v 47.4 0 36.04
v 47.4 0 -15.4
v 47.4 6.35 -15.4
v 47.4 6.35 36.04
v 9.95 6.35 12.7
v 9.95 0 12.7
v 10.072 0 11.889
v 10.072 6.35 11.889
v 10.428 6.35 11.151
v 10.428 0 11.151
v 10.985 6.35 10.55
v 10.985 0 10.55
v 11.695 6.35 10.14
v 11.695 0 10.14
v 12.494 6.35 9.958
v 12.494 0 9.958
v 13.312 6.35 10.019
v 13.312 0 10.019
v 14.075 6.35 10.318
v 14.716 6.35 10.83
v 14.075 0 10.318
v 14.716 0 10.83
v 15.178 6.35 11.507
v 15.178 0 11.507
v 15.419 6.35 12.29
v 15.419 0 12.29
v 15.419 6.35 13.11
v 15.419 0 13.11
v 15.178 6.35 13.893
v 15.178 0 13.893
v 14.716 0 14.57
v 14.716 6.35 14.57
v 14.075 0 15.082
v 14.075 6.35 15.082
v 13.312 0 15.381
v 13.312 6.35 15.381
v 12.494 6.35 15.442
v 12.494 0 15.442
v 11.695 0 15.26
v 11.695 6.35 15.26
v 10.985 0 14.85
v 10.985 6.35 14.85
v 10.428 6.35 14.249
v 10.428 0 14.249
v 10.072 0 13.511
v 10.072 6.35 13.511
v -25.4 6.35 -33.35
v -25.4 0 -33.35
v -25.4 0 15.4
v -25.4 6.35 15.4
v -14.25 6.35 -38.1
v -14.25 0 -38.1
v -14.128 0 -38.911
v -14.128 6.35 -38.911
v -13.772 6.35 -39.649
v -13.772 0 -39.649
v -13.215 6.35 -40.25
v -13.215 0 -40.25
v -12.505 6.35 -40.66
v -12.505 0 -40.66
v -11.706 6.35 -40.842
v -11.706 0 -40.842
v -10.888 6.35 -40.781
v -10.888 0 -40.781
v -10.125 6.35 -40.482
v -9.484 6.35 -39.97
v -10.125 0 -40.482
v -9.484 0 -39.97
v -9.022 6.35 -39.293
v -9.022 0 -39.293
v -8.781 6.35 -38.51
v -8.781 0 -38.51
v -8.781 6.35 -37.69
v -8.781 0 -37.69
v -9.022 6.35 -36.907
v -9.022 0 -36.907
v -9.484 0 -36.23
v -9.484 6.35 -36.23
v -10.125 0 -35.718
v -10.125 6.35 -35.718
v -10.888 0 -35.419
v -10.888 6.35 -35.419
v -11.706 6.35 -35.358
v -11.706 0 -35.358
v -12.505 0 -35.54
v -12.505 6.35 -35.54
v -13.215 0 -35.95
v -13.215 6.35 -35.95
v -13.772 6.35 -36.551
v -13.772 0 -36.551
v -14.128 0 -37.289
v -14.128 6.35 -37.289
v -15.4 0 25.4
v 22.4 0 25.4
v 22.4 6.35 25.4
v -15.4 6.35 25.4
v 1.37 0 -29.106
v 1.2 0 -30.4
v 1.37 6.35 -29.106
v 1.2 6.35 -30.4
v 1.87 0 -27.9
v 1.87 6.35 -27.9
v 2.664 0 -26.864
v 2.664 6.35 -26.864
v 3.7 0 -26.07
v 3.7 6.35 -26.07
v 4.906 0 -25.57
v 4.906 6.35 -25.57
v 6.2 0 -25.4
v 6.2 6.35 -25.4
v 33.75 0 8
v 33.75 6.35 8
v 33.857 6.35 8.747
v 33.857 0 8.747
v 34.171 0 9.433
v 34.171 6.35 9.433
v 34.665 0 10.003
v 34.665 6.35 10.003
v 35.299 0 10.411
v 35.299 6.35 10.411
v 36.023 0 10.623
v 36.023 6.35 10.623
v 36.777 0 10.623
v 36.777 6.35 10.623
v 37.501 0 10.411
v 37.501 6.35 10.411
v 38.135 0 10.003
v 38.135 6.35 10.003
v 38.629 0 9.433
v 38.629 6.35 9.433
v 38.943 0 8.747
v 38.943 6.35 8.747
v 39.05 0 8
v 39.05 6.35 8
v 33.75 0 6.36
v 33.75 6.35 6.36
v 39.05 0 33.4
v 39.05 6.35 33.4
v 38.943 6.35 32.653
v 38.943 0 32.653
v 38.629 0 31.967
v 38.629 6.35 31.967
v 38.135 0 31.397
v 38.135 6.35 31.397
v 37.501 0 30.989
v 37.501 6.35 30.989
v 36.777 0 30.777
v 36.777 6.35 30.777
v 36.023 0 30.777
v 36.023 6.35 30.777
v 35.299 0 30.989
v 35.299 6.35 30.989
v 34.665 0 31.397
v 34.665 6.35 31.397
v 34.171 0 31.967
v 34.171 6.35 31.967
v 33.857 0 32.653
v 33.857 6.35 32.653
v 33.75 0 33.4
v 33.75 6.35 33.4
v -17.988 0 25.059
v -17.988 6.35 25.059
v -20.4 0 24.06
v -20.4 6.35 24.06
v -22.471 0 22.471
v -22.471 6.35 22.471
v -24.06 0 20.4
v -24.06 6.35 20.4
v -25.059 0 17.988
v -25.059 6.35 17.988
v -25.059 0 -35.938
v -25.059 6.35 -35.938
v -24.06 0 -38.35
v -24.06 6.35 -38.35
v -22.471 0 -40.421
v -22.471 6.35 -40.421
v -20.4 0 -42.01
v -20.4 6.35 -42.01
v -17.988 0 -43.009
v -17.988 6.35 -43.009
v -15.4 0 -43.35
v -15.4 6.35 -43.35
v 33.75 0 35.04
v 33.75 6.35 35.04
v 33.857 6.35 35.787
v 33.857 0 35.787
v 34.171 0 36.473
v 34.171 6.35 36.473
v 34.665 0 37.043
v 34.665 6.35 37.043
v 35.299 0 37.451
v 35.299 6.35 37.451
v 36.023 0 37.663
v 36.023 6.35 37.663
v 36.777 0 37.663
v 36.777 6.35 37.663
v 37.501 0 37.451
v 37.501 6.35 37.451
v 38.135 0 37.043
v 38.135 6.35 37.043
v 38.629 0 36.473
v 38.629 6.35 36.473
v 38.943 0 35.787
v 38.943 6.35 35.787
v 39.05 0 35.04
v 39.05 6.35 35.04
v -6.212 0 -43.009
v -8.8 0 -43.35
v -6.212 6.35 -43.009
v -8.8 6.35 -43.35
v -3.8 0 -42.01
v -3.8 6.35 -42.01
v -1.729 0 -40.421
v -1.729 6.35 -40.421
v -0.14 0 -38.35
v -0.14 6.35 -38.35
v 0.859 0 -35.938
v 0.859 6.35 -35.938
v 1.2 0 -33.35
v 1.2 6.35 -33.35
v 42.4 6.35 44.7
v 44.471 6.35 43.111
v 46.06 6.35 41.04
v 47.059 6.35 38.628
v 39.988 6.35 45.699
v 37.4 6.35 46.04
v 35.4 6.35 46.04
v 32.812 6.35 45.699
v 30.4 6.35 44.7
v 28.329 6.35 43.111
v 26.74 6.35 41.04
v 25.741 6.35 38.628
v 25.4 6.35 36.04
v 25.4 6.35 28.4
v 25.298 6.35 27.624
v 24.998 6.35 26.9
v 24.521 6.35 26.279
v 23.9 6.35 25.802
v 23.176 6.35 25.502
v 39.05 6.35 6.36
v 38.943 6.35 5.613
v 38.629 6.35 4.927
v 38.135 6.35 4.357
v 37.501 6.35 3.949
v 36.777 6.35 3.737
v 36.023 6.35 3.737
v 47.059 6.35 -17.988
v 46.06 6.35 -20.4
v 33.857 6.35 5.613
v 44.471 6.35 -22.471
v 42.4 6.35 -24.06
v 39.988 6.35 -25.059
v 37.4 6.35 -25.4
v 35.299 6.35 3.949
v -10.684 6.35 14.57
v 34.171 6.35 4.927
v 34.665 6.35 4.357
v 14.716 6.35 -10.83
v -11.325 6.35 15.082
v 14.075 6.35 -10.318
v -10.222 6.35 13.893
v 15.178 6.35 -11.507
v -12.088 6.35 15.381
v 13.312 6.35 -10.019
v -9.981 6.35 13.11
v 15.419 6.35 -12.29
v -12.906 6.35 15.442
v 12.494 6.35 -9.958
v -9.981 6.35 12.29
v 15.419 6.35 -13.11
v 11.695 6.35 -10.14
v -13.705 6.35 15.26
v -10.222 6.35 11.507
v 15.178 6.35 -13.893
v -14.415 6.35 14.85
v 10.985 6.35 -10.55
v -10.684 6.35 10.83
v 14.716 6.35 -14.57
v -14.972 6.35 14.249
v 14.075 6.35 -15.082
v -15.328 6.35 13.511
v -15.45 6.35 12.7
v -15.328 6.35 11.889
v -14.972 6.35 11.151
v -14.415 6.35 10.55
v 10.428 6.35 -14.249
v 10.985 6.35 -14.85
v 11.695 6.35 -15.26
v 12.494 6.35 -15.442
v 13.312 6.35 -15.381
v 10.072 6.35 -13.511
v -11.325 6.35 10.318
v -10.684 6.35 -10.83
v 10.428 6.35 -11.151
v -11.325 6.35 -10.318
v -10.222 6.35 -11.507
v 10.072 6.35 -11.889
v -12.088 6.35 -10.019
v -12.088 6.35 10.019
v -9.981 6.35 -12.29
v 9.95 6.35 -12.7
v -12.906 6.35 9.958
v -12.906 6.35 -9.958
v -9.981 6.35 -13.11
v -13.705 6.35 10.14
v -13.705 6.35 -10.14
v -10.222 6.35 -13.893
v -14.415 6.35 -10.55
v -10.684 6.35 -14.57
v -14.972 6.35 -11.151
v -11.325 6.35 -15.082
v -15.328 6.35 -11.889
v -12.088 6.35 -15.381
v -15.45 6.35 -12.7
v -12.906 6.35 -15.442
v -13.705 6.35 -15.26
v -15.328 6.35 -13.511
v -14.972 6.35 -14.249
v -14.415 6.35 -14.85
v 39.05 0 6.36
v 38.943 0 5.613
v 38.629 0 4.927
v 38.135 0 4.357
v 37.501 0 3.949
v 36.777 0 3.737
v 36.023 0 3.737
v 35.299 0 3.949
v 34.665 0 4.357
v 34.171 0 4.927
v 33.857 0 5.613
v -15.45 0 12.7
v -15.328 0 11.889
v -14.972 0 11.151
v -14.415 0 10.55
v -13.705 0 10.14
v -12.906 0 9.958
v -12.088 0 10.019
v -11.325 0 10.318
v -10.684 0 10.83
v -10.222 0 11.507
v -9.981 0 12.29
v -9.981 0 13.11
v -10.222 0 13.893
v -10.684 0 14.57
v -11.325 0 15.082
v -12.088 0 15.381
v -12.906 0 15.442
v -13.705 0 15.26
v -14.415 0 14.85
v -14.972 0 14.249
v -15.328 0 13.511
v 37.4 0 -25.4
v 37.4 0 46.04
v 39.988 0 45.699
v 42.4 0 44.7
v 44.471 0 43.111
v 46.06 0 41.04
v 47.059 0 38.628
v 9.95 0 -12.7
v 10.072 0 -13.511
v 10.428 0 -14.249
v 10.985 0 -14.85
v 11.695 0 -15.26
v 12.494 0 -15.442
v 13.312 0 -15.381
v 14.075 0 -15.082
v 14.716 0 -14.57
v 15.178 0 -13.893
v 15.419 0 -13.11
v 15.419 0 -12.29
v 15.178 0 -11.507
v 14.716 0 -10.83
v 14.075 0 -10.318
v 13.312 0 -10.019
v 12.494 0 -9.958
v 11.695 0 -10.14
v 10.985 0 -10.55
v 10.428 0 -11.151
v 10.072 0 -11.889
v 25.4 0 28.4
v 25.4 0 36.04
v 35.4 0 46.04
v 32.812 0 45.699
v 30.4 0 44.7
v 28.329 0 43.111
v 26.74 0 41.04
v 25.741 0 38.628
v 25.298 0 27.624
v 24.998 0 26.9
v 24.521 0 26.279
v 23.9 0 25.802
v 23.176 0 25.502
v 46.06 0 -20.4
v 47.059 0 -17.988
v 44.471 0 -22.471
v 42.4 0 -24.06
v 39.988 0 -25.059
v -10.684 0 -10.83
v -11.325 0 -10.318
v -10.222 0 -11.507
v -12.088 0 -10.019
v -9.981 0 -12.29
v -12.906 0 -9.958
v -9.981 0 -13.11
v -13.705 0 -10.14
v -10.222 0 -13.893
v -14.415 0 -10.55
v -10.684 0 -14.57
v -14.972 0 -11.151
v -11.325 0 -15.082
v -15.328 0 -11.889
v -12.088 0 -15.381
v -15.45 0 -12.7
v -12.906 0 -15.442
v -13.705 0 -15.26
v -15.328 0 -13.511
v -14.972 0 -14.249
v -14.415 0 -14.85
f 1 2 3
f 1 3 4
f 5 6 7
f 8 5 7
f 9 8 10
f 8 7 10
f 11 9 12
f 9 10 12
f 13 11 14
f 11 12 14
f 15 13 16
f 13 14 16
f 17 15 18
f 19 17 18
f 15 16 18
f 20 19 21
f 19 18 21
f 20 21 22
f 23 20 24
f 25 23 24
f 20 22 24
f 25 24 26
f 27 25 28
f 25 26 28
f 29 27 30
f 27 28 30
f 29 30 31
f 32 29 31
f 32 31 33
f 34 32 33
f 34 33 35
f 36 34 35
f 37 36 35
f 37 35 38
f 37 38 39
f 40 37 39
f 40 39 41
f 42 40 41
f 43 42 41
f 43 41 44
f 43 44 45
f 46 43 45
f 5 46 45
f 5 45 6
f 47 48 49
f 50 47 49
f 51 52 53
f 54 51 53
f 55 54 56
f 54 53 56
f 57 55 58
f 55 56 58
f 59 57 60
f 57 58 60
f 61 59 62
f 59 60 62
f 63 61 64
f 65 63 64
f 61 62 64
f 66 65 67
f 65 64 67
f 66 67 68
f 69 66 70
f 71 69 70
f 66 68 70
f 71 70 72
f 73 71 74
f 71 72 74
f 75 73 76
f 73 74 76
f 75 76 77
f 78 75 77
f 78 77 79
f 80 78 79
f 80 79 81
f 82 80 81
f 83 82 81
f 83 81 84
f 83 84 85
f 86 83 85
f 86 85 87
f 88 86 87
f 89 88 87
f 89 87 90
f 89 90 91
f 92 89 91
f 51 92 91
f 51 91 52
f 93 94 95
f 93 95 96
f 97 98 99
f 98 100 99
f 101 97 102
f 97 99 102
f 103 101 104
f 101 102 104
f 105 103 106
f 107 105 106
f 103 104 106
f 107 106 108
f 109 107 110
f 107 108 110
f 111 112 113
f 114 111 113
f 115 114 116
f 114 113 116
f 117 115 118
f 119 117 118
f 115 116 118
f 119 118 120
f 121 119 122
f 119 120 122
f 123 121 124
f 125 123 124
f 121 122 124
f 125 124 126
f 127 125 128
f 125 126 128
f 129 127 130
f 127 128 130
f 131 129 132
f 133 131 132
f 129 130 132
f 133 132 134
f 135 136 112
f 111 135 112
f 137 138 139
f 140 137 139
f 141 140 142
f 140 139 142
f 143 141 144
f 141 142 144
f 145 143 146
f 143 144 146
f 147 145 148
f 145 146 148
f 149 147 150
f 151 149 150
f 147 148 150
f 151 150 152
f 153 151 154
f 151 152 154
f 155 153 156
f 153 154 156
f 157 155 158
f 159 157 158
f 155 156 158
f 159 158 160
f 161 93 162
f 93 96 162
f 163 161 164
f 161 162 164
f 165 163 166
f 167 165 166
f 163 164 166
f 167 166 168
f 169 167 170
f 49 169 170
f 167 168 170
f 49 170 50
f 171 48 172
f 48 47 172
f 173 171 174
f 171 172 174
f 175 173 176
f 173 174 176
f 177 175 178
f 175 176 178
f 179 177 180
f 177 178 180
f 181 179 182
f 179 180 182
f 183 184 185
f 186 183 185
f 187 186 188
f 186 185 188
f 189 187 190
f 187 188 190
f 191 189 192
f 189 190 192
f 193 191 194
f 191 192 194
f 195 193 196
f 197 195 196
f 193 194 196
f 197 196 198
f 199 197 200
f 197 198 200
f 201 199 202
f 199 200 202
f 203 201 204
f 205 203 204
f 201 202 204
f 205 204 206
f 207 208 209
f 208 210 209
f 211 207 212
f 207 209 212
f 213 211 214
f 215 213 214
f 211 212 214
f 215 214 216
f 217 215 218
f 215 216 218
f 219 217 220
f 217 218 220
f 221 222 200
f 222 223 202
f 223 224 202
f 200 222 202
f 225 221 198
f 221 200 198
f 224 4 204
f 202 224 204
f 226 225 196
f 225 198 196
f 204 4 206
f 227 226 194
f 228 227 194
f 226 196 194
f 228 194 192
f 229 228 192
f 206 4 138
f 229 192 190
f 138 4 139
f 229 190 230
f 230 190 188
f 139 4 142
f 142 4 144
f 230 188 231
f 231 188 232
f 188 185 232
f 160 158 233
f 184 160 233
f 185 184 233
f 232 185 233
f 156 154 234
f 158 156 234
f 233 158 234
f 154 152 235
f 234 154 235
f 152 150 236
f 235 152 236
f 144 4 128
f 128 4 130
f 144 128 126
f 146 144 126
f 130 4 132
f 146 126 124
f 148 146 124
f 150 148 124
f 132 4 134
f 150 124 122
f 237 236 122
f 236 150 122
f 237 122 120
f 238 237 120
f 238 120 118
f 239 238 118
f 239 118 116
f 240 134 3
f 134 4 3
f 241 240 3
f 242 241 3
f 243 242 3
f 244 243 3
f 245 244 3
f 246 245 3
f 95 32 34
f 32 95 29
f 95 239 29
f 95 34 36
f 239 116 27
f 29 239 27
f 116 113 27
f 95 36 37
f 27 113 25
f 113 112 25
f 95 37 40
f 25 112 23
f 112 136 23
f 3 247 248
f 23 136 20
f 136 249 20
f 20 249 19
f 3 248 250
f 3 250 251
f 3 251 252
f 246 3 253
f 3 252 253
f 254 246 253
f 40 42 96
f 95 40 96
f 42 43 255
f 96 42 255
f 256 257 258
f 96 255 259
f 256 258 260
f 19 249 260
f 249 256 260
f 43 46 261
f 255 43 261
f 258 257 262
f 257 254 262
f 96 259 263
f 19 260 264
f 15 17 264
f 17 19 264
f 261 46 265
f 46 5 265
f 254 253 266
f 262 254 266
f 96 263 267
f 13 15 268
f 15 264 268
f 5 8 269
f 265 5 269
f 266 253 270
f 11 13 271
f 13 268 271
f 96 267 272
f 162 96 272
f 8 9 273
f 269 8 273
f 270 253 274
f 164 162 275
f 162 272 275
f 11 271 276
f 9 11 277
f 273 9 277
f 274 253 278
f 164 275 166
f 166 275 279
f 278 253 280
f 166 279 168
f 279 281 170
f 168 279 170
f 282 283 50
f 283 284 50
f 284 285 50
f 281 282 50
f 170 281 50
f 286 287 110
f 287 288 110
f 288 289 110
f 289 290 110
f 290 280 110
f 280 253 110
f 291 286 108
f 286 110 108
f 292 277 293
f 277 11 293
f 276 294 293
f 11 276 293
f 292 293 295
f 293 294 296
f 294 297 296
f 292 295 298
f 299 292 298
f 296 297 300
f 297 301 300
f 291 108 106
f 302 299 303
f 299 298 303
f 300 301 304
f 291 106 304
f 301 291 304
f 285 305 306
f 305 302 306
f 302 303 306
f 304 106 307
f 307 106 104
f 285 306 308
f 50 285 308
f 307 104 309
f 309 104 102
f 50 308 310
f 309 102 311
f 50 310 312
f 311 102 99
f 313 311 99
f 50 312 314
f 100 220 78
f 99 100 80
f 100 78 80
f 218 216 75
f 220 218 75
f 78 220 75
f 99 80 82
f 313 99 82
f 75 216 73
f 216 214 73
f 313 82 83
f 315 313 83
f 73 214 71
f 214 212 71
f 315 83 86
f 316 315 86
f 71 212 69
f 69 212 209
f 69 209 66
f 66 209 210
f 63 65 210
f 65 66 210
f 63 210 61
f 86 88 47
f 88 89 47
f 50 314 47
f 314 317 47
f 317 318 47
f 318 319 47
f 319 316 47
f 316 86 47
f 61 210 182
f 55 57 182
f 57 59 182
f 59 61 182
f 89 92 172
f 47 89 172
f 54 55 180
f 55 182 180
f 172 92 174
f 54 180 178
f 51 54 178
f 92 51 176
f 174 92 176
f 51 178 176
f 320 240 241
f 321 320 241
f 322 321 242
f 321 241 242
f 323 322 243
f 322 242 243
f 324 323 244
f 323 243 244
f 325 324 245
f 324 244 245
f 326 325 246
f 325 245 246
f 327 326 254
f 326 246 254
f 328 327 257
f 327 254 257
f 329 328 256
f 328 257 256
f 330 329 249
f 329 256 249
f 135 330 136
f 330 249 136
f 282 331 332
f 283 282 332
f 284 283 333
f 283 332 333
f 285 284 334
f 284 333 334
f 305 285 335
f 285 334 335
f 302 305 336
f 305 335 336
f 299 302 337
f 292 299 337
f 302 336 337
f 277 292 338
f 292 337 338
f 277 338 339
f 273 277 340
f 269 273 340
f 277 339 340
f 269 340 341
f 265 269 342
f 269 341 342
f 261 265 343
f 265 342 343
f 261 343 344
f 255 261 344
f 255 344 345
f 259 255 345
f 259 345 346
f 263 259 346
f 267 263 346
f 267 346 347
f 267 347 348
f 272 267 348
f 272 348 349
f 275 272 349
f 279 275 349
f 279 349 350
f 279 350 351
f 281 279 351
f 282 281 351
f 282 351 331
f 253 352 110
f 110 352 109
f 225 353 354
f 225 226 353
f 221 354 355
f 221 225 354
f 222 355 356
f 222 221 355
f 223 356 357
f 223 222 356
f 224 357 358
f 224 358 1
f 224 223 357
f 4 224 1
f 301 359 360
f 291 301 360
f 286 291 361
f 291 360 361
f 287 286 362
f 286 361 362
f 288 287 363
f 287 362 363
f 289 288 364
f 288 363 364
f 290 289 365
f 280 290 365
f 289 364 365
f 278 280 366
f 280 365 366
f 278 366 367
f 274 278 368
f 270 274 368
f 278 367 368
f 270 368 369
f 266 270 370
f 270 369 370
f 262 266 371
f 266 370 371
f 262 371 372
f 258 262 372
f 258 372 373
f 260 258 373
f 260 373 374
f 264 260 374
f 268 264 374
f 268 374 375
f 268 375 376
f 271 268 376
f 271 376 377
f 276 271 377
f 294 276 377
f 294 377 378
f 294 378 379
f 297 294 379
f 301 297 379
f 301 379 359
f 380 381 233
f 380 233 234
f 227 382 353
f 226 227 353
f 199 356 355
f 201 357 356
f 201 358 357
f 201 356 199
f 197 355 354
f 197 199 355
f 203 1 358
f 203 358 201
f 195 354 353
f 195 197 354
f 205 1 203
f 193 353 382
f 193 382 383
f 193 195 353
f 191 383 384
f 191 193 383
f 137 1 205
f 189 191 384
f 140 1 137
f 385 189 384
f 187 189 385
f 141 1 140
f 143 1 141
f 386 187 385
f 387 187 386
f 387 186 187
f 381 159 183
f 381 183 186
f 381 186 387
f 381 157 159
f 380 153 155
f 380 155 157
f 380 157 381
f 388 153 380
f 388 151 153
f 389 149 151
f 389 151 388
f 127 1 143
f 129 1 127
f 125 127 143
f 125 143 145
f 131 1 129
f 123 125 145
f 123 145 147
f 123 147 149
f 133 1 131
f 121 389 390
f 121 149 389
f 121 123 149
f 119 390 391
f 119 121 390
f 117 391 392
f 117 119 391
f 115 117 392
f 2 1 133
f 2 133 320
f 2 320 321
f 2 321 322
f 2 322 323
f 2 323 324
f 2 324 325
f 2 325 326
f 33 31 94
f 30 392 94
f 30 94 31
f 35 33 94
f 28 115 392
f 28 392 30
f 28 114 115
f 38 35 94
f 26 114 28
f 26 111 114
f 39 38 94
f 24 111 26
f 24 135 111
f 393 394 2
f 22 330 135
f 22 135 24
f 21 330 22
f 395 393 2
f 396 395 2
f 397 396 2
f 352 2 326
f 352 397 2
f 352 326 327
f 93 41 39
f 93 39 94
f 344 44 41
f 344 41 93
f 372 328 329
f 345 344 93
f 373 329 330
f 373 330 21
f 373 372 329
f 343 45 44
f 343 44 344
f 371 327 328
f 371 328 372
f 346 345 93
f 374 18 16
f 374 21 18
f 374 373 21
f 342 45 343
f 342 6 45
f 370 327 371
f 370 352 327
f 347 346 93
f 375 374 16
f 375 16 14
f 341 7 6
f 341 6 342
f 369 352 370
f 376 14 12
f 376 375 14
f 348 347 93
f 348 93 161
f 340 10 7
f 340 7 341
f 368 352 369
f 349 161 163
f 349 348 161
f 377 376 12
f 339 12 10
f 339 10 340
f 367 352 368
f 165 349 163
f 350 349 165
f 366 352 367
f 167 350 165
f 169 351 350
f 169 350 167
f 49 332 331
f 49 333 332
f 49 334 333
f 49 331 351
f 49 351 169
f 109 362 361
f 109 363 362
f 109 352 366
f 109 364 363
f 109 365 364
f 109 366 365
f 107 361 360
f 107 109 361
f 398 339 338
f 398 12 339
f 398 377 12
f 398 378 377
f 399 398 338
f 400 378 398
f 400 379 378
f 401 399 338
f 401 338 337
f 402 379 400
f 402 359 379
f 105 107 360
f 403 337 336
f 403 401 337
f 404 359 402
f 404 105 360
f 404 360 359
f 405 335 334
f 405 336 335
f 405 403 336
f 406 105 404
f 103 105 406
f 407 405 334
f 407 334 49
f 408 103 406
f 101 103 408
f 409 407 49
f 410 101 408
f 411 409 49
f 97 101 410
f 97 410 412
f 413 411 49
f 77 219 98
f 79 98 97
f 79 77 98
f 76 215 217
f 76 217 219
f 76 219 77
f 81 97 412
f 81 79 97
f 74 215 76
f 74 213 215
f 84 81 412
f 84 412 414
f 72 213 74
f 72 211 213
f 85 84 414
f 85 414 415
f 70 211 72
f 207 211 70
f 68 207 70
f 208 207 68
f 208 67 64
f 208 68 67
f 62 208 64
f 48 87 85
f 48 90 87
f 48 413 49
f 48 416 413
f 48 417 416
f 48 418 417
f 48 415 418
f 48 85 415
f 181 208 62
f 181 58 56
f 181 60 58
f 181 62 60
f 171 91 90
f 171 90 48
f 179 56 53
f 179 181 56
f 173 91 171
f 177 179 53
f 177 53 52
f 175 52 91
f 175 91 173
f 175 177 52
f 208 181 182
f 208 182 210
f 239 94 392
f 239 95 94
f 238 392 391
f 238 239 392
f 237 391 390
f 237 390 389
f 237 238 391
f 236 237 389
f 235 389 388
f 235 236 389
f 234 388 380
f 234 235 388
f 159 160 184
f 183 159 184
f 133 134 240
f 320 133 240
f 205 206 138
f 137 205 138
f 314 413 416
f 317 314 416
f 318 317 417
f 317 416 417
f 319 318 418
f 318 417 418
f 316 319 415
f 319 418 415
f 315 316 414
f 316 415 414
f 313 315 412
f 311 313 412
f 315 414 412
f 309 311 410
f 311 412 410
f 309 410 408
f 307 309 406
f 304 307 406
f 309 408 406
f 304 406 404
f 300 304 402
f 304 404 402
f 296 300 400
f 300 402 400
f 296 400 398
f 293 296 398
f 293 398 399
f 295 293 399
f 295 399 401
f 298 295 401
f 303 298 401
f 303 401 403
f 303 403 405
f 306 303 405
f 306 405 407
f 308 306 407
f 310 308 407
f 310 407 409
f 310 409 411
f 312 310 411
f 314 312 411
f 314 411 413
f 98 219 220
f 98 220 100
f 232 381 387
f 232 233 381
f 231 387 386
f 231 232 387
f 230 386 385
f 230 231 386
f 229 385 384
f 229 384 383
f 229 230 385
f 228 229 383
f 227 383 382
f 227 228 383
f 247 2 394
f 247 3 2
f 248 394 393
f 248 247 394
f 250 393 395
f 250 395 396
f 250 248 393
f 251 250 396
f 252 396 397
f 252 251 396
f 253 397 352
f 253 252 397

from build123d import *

# Parameters (mm, degrees)
BOSS_EXTRUDE1_DEPTH  = 6.35
M5_CLEARANCE_HOLE1_D = 5.5
CUT_EXTRUDE2_DEPTH   = 7.35
FILLET1_R            = 10
FILLET2_R            = 3
FILLET3_R            = 5


with BuildPart() as part:
    # Sketch1 → Boss-Extrude1 (new body)
    with BuildSketch(Plane(origin=(0, 0, 0), x_dir=(1, 0, 0), z_dir=(0, 1, 0))):
        Polygon((25.4, -25.4), (-25.4, -25.4), (-25.4, 25.4), (-25.4, 43.35), (1.2, 43.35), (1.2, 25.4), (25.4, 25.4), (47.4, 25.4), (47.4, -46.04), (36.4, -46.04), (25.4, -46.04), align=None)
    extrude(amount=BOSS_EXTRUDE1_DEPTH)

    # M5 Clearance Hole1 (through all)
    with Locations(Plane(origin=(0, 6.35, 0), x_dir=(1, 0, 0), z_dir=(0, 1, 0))):
        with Locations((-12.7, 12.7), (12.7, 12.7), (12.7, -12.7), (-12.7, -12.7), (-11.5, 38.1)):
            Hole(M5_CLEARANCE_HOLE1_D / 2)

    # Sketch7 → Cut-Extrude2 (cut, through all)
    with BuildSketch(Plane(origin=(0, 6.35, 0), x_dir=(1, 0, 0), z_dir=(0, 1, 0))):
        with BuildLine():
            Line((33.75, -33.4), (33.75, -35.04))
            ThreePointArc((33.75, -35.04), (36.4, -37.69), (39.05, -35.04))
            Line((39.05, -35.04), (39.05, -33.4))
            ThreePointArc((39.05, -33.4), (36.4, -30.75), (33.75, -33.4))
        make_face()
        with BuildLine():
            Line((33.75, -6.36), (33.75, -8))
            ThreePointArc((33.75, -8), (36.4, -10.65), (39.05, -8))
            Line((39.05, -8), (39.05, -6.36))
            ThreePointArc((39.05, -6.36), (36.4, -3.71), (33.75, -6.36))
        make_face()
    extrude(amount=-CUT_EXTRUDE2_DEPTH, mode=Mode.SUBTRACT)

    # Fillet1
    fillet1_edges = [part.edges().sort_by_distance(p)[0] for p in [
        (-25.4, 3.175, -43.35),
        (1.2, 3.175, -43.35),
        (47.4, 3.175, -25.4),
        (47.4, 3.175, 46.04),
        (25.4, 3.175, 46.04),
        (-25.4, 3.175, 25.4),
    ]]
    fillet(fillet1_edges, radius=FILLET1_R)

    # Fillet2
    fillet2_edges = [part.edges().sort_by_distance(p)[0] for p in [
        (25.4, 3.175, 25.4),
    ]]
    fillet(fillet2_edges, radius=FILLET2_R)

    # Fillet3
    fillet3_edges = [part.edges().sort_by_distance(p)[0] for p in [
        (1.2, 3.175, -25.4),
    ]]
    fillet(fillet3_edges, radius=FILLET3_R)


solid = part.part
